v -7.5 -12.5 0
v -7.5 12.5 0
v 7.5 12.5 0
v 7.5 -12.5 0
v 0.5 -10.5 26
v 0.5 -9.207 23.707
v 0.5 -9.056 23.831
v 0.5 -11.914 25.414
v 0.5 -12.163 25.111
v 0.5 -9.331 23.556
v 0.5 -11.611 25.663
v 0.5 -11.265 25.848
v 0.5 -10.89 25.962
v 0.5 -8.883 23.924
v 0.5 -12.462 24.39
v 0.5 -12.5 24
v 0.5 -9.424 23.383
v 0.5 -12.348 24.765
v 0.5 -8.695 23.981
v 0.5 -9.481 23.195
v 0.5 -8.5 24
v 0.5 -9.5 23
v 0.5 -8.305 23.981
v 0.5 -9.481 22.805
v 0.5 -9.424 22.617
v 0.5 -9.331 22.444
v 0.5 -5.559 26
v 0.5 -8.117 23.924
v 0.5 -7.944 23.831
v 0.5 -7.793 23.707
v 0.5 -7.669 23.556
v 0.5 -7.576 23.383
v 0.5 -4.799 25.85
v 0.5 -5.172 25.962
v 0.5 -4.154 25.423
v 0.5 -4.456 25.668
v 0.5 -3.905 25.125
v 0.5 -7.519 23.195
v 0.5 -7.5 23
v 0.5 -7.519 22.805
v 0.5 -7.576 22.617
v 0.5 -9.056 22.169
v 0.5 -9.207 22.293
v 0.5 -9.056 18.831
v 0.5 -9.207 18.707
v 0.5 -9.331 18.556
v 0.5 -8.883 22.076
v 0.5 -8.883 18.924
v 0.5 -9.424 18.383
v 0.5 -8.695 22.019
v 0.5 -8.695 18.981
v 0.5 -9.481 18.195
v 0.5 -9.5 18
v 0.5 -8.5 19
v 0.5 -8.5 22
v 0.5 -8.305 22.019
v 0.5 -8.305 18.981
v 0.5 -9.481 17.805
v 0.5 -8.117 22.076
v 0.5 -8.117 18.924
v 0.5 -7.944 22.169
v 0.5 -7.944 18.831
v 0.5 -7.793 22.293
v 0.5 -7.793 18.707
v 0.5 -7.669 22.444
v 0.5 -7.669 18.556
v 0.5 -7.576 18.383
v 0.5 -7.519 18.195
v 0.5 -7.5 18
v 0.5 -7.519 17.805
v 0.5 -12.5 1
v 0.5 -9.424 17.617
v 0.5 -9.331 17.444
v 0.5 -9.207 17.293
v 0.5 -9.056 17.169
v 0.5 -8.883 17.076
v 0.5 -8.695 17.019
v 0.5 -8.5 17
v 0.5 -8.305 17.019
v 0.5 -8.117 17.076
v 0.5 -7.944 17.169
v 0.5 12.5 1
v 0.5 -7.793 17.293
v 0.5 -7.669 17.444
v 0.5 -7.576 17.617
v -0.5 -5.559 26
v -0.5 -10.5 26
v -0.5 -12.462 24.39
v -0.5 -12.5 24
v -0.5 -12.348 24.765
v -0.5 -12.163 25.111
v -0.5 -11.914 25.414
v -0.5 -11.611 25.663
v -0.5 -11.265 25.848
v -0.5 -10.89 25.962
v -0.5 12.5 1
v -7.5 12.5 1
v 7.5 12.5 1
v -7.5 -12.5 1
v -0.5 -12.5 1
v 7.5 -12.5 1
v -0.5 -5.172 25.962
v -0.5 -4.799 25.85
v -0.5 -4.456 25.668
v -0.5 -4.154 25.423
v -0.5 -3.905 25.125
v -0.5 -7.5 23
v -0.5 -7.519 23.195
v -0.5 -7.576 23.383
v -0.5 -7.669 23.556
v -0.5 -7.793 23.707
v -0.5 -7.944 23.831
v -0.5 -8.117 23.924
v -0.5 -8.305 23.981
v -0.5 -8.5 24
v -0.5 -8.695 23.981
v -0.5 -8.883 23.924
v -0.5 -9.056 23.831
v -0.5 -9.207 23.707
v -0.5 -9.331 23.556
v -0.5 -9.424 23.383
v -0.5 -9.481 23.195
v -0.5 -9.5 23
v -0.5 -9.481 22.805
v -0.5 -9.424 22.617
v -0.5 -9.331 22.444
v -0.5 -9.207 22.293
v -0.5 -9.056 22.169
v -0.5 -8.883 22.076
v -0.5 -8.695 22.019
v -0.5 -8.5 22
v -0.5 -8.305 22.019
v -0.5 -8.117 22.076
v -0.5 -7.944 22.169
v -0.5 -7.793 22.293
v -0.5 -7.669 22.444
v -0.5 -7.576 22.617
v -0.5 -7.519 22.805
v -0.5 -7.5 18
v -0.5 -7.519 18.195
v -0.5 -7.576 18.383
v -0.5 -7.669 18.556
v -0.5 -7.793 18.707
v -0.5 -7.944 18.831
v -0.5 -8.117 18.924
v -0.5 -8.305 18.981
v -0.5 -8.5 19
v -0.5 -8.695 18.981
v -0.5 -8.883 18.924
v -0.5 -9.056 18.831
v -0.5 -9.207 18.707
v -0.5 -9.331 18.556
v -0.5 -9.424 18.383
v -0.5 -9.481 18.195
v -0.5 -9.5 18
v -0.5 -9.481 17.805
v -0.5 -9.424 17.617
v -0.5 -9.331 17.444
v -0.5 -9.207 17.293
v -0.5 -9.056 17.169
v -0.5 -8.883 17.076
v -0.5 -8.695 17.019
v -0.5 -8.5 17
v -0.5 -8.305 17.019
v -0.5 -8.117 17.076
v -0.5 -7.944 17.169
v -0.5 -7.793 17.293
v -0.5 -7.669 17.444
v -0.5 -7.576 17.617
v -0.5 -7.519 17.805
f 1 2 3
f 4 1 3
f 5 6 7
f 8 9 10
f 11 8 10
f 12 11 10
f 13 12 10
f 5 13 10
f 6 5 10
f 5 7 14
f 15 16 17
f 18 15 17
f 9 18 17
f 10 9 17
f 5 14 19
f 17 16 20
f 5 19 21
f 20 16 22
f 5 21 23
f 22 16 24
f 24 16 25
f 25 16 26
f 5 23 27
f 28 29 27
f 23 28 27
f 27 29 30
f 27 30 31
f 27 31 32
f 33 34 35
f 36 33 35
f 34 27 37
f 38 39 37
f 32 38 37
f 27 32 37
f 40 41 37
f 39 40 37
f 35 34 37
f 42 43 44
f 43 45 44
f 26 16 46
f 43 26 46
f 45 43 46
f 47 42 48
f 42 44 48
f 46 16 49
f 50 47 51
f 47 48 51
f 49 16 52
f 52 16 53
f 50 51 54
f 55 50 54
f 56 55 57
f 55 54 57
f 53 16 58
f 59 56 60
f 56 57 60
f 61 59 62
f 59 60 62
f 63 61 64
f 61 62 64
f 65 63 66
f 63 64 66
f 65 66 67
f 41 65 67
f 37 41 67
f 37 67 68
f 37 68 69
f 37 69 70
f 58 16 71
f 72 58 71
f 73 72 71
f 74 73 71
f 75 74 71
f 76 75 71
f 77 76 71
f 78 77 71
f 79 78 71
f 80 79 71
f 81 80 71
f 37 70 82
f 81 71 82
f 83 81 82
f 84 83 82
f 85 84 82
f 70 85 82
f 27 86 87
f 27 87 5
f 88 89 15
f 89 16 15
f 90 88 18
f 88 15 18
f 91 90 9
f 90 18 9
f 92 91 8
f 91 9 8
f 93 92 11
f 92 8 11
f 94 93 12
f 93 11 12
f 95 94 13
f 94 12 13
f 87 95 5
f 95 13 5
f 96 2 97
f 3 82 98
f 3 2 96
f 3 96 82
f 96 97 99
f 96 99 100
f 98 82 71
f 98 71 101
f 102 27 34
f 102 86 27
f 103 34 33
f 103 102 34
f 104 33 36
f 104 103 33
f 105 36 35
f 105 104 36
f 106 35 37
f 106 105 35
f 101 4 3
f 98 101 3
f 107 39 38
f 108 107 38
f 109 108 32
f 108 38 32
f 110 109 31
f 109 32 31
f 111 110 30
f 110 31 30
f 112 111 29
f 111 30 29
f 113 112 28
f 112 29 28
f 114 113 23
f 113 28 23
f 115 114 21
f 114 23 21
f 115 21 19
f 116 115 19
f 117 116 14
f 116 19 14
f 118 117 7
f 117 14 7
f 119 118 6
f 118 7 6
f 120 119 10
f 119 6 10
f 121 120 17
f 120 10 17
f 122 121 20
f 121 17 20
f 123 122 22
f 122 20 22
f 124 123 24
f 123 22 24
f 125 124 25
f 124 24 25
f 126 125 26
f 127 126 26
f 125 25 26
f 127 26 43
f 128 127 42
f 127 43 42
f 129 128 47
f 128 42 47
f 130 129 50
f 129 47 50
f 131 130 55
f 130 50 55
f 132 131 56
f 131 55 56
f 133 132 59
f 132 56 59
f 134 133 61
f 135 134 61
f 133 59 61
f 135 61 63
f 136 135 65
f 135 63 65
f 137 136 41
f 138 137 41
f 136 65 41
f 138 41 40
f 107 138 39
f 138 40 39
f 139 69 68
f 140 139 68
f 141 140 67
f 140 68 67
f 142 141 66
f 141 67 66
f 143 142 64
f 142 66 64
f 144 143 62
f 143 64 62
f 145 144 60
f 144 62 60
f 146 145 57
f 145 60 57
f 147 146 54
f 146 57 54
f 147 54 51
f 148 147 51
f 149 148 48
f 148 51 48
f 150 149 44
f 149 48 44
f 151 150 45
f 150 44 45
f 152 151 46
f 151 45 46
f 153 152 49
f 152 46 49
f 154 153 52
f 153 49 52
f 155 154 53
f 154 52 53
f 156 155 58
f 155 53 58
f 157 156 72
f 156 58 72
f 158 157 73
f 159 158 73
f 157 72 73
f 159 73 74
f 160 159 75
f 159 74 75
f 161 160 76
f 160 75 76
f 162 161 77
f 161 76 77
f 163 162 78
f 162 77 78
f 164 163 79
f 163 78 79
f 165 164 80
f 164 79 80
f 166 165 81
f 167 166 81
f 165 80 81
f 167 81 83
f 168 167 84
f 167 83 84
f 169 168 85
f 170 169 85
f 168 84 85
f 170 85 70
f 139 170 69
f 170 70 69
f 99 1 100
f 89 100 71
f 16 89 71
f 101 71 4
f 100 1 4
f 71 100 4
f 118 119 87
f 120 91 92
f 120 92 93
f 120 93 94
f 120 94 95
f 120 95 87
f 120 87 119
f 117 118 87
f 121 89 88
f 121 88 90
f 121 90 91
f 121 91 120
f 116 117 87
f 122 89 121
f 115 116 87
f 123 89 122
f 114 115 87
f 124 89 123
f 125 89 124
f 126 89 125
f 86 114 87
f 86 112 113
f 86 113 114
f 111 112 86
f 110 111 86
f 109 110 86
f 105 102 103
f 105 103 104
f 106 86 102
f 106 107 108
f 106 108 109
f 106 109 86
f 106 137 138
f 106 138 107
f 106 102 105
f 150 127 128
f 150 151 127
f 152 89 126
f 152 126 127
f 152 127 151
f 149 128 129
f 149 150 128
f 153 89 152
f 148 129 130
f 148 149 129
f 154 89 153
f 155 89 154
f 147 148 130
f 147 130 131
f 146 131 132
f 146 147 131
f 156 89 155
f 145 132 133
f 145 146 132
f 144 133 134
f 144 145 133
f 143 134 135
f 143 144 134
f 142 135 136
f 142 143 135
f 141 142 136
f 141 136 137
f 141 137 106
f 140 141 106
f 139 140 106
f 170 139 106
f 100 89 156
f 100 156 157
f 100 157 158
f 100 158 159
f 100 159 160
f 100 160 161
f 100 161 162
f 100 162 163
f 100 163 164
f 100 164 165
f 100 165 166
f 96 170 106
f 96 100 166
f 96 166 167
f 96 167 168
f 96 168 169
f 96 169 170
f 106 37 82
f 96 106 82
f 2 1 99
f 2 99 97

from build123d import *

# Parameters (mm, degrees)
F0_W     = 15
F0_H     = 25
F1_DEPTH = 1
F2_W     = 1
F2_H     = 25
F3_DEPTH = 25
F4_R     = 1
F5_DEPTH = 1
F6_R     = 2


with BuildPart() as f1:
    # F0 (on Top) → F1 (new body)
    with BuildSketch(Plane.XY):
        Rectangle(F0_W, F0_H)
    extrude(amount=F1_DEPTH)

    # F2 (on face) → F3 (join)
    with BuildSketch(Plane.XY.offset(1)):
        Rectangle(F2_W, F2_H)
    extrude(amount=F3_DEPTH)

    # F4 (on face) → F5 (cut, through all)
    with BuildSketch(Plane.YZ.offset(0.5)):
        Polygon((-4.5, 26), (12.5, 1), (12.5, 26), align=None)
        with Locations((-8.5, 23)):
            Circle(F4_R)
        with Locations((-8.5, 18)):
            Circle(F4_R)
    extrude(amount=-F5_DEPTH, mode=Mode.SUBTRACT)

    # F6
    f6_edges = [f1.edges().sort_by_distance(p)[0] for p in [
        (0, -12.5, 26),
        (0, -4.5, 26),
    ]]
    fillet(f6_edges, radius=F6_R)


solid = f1.part
